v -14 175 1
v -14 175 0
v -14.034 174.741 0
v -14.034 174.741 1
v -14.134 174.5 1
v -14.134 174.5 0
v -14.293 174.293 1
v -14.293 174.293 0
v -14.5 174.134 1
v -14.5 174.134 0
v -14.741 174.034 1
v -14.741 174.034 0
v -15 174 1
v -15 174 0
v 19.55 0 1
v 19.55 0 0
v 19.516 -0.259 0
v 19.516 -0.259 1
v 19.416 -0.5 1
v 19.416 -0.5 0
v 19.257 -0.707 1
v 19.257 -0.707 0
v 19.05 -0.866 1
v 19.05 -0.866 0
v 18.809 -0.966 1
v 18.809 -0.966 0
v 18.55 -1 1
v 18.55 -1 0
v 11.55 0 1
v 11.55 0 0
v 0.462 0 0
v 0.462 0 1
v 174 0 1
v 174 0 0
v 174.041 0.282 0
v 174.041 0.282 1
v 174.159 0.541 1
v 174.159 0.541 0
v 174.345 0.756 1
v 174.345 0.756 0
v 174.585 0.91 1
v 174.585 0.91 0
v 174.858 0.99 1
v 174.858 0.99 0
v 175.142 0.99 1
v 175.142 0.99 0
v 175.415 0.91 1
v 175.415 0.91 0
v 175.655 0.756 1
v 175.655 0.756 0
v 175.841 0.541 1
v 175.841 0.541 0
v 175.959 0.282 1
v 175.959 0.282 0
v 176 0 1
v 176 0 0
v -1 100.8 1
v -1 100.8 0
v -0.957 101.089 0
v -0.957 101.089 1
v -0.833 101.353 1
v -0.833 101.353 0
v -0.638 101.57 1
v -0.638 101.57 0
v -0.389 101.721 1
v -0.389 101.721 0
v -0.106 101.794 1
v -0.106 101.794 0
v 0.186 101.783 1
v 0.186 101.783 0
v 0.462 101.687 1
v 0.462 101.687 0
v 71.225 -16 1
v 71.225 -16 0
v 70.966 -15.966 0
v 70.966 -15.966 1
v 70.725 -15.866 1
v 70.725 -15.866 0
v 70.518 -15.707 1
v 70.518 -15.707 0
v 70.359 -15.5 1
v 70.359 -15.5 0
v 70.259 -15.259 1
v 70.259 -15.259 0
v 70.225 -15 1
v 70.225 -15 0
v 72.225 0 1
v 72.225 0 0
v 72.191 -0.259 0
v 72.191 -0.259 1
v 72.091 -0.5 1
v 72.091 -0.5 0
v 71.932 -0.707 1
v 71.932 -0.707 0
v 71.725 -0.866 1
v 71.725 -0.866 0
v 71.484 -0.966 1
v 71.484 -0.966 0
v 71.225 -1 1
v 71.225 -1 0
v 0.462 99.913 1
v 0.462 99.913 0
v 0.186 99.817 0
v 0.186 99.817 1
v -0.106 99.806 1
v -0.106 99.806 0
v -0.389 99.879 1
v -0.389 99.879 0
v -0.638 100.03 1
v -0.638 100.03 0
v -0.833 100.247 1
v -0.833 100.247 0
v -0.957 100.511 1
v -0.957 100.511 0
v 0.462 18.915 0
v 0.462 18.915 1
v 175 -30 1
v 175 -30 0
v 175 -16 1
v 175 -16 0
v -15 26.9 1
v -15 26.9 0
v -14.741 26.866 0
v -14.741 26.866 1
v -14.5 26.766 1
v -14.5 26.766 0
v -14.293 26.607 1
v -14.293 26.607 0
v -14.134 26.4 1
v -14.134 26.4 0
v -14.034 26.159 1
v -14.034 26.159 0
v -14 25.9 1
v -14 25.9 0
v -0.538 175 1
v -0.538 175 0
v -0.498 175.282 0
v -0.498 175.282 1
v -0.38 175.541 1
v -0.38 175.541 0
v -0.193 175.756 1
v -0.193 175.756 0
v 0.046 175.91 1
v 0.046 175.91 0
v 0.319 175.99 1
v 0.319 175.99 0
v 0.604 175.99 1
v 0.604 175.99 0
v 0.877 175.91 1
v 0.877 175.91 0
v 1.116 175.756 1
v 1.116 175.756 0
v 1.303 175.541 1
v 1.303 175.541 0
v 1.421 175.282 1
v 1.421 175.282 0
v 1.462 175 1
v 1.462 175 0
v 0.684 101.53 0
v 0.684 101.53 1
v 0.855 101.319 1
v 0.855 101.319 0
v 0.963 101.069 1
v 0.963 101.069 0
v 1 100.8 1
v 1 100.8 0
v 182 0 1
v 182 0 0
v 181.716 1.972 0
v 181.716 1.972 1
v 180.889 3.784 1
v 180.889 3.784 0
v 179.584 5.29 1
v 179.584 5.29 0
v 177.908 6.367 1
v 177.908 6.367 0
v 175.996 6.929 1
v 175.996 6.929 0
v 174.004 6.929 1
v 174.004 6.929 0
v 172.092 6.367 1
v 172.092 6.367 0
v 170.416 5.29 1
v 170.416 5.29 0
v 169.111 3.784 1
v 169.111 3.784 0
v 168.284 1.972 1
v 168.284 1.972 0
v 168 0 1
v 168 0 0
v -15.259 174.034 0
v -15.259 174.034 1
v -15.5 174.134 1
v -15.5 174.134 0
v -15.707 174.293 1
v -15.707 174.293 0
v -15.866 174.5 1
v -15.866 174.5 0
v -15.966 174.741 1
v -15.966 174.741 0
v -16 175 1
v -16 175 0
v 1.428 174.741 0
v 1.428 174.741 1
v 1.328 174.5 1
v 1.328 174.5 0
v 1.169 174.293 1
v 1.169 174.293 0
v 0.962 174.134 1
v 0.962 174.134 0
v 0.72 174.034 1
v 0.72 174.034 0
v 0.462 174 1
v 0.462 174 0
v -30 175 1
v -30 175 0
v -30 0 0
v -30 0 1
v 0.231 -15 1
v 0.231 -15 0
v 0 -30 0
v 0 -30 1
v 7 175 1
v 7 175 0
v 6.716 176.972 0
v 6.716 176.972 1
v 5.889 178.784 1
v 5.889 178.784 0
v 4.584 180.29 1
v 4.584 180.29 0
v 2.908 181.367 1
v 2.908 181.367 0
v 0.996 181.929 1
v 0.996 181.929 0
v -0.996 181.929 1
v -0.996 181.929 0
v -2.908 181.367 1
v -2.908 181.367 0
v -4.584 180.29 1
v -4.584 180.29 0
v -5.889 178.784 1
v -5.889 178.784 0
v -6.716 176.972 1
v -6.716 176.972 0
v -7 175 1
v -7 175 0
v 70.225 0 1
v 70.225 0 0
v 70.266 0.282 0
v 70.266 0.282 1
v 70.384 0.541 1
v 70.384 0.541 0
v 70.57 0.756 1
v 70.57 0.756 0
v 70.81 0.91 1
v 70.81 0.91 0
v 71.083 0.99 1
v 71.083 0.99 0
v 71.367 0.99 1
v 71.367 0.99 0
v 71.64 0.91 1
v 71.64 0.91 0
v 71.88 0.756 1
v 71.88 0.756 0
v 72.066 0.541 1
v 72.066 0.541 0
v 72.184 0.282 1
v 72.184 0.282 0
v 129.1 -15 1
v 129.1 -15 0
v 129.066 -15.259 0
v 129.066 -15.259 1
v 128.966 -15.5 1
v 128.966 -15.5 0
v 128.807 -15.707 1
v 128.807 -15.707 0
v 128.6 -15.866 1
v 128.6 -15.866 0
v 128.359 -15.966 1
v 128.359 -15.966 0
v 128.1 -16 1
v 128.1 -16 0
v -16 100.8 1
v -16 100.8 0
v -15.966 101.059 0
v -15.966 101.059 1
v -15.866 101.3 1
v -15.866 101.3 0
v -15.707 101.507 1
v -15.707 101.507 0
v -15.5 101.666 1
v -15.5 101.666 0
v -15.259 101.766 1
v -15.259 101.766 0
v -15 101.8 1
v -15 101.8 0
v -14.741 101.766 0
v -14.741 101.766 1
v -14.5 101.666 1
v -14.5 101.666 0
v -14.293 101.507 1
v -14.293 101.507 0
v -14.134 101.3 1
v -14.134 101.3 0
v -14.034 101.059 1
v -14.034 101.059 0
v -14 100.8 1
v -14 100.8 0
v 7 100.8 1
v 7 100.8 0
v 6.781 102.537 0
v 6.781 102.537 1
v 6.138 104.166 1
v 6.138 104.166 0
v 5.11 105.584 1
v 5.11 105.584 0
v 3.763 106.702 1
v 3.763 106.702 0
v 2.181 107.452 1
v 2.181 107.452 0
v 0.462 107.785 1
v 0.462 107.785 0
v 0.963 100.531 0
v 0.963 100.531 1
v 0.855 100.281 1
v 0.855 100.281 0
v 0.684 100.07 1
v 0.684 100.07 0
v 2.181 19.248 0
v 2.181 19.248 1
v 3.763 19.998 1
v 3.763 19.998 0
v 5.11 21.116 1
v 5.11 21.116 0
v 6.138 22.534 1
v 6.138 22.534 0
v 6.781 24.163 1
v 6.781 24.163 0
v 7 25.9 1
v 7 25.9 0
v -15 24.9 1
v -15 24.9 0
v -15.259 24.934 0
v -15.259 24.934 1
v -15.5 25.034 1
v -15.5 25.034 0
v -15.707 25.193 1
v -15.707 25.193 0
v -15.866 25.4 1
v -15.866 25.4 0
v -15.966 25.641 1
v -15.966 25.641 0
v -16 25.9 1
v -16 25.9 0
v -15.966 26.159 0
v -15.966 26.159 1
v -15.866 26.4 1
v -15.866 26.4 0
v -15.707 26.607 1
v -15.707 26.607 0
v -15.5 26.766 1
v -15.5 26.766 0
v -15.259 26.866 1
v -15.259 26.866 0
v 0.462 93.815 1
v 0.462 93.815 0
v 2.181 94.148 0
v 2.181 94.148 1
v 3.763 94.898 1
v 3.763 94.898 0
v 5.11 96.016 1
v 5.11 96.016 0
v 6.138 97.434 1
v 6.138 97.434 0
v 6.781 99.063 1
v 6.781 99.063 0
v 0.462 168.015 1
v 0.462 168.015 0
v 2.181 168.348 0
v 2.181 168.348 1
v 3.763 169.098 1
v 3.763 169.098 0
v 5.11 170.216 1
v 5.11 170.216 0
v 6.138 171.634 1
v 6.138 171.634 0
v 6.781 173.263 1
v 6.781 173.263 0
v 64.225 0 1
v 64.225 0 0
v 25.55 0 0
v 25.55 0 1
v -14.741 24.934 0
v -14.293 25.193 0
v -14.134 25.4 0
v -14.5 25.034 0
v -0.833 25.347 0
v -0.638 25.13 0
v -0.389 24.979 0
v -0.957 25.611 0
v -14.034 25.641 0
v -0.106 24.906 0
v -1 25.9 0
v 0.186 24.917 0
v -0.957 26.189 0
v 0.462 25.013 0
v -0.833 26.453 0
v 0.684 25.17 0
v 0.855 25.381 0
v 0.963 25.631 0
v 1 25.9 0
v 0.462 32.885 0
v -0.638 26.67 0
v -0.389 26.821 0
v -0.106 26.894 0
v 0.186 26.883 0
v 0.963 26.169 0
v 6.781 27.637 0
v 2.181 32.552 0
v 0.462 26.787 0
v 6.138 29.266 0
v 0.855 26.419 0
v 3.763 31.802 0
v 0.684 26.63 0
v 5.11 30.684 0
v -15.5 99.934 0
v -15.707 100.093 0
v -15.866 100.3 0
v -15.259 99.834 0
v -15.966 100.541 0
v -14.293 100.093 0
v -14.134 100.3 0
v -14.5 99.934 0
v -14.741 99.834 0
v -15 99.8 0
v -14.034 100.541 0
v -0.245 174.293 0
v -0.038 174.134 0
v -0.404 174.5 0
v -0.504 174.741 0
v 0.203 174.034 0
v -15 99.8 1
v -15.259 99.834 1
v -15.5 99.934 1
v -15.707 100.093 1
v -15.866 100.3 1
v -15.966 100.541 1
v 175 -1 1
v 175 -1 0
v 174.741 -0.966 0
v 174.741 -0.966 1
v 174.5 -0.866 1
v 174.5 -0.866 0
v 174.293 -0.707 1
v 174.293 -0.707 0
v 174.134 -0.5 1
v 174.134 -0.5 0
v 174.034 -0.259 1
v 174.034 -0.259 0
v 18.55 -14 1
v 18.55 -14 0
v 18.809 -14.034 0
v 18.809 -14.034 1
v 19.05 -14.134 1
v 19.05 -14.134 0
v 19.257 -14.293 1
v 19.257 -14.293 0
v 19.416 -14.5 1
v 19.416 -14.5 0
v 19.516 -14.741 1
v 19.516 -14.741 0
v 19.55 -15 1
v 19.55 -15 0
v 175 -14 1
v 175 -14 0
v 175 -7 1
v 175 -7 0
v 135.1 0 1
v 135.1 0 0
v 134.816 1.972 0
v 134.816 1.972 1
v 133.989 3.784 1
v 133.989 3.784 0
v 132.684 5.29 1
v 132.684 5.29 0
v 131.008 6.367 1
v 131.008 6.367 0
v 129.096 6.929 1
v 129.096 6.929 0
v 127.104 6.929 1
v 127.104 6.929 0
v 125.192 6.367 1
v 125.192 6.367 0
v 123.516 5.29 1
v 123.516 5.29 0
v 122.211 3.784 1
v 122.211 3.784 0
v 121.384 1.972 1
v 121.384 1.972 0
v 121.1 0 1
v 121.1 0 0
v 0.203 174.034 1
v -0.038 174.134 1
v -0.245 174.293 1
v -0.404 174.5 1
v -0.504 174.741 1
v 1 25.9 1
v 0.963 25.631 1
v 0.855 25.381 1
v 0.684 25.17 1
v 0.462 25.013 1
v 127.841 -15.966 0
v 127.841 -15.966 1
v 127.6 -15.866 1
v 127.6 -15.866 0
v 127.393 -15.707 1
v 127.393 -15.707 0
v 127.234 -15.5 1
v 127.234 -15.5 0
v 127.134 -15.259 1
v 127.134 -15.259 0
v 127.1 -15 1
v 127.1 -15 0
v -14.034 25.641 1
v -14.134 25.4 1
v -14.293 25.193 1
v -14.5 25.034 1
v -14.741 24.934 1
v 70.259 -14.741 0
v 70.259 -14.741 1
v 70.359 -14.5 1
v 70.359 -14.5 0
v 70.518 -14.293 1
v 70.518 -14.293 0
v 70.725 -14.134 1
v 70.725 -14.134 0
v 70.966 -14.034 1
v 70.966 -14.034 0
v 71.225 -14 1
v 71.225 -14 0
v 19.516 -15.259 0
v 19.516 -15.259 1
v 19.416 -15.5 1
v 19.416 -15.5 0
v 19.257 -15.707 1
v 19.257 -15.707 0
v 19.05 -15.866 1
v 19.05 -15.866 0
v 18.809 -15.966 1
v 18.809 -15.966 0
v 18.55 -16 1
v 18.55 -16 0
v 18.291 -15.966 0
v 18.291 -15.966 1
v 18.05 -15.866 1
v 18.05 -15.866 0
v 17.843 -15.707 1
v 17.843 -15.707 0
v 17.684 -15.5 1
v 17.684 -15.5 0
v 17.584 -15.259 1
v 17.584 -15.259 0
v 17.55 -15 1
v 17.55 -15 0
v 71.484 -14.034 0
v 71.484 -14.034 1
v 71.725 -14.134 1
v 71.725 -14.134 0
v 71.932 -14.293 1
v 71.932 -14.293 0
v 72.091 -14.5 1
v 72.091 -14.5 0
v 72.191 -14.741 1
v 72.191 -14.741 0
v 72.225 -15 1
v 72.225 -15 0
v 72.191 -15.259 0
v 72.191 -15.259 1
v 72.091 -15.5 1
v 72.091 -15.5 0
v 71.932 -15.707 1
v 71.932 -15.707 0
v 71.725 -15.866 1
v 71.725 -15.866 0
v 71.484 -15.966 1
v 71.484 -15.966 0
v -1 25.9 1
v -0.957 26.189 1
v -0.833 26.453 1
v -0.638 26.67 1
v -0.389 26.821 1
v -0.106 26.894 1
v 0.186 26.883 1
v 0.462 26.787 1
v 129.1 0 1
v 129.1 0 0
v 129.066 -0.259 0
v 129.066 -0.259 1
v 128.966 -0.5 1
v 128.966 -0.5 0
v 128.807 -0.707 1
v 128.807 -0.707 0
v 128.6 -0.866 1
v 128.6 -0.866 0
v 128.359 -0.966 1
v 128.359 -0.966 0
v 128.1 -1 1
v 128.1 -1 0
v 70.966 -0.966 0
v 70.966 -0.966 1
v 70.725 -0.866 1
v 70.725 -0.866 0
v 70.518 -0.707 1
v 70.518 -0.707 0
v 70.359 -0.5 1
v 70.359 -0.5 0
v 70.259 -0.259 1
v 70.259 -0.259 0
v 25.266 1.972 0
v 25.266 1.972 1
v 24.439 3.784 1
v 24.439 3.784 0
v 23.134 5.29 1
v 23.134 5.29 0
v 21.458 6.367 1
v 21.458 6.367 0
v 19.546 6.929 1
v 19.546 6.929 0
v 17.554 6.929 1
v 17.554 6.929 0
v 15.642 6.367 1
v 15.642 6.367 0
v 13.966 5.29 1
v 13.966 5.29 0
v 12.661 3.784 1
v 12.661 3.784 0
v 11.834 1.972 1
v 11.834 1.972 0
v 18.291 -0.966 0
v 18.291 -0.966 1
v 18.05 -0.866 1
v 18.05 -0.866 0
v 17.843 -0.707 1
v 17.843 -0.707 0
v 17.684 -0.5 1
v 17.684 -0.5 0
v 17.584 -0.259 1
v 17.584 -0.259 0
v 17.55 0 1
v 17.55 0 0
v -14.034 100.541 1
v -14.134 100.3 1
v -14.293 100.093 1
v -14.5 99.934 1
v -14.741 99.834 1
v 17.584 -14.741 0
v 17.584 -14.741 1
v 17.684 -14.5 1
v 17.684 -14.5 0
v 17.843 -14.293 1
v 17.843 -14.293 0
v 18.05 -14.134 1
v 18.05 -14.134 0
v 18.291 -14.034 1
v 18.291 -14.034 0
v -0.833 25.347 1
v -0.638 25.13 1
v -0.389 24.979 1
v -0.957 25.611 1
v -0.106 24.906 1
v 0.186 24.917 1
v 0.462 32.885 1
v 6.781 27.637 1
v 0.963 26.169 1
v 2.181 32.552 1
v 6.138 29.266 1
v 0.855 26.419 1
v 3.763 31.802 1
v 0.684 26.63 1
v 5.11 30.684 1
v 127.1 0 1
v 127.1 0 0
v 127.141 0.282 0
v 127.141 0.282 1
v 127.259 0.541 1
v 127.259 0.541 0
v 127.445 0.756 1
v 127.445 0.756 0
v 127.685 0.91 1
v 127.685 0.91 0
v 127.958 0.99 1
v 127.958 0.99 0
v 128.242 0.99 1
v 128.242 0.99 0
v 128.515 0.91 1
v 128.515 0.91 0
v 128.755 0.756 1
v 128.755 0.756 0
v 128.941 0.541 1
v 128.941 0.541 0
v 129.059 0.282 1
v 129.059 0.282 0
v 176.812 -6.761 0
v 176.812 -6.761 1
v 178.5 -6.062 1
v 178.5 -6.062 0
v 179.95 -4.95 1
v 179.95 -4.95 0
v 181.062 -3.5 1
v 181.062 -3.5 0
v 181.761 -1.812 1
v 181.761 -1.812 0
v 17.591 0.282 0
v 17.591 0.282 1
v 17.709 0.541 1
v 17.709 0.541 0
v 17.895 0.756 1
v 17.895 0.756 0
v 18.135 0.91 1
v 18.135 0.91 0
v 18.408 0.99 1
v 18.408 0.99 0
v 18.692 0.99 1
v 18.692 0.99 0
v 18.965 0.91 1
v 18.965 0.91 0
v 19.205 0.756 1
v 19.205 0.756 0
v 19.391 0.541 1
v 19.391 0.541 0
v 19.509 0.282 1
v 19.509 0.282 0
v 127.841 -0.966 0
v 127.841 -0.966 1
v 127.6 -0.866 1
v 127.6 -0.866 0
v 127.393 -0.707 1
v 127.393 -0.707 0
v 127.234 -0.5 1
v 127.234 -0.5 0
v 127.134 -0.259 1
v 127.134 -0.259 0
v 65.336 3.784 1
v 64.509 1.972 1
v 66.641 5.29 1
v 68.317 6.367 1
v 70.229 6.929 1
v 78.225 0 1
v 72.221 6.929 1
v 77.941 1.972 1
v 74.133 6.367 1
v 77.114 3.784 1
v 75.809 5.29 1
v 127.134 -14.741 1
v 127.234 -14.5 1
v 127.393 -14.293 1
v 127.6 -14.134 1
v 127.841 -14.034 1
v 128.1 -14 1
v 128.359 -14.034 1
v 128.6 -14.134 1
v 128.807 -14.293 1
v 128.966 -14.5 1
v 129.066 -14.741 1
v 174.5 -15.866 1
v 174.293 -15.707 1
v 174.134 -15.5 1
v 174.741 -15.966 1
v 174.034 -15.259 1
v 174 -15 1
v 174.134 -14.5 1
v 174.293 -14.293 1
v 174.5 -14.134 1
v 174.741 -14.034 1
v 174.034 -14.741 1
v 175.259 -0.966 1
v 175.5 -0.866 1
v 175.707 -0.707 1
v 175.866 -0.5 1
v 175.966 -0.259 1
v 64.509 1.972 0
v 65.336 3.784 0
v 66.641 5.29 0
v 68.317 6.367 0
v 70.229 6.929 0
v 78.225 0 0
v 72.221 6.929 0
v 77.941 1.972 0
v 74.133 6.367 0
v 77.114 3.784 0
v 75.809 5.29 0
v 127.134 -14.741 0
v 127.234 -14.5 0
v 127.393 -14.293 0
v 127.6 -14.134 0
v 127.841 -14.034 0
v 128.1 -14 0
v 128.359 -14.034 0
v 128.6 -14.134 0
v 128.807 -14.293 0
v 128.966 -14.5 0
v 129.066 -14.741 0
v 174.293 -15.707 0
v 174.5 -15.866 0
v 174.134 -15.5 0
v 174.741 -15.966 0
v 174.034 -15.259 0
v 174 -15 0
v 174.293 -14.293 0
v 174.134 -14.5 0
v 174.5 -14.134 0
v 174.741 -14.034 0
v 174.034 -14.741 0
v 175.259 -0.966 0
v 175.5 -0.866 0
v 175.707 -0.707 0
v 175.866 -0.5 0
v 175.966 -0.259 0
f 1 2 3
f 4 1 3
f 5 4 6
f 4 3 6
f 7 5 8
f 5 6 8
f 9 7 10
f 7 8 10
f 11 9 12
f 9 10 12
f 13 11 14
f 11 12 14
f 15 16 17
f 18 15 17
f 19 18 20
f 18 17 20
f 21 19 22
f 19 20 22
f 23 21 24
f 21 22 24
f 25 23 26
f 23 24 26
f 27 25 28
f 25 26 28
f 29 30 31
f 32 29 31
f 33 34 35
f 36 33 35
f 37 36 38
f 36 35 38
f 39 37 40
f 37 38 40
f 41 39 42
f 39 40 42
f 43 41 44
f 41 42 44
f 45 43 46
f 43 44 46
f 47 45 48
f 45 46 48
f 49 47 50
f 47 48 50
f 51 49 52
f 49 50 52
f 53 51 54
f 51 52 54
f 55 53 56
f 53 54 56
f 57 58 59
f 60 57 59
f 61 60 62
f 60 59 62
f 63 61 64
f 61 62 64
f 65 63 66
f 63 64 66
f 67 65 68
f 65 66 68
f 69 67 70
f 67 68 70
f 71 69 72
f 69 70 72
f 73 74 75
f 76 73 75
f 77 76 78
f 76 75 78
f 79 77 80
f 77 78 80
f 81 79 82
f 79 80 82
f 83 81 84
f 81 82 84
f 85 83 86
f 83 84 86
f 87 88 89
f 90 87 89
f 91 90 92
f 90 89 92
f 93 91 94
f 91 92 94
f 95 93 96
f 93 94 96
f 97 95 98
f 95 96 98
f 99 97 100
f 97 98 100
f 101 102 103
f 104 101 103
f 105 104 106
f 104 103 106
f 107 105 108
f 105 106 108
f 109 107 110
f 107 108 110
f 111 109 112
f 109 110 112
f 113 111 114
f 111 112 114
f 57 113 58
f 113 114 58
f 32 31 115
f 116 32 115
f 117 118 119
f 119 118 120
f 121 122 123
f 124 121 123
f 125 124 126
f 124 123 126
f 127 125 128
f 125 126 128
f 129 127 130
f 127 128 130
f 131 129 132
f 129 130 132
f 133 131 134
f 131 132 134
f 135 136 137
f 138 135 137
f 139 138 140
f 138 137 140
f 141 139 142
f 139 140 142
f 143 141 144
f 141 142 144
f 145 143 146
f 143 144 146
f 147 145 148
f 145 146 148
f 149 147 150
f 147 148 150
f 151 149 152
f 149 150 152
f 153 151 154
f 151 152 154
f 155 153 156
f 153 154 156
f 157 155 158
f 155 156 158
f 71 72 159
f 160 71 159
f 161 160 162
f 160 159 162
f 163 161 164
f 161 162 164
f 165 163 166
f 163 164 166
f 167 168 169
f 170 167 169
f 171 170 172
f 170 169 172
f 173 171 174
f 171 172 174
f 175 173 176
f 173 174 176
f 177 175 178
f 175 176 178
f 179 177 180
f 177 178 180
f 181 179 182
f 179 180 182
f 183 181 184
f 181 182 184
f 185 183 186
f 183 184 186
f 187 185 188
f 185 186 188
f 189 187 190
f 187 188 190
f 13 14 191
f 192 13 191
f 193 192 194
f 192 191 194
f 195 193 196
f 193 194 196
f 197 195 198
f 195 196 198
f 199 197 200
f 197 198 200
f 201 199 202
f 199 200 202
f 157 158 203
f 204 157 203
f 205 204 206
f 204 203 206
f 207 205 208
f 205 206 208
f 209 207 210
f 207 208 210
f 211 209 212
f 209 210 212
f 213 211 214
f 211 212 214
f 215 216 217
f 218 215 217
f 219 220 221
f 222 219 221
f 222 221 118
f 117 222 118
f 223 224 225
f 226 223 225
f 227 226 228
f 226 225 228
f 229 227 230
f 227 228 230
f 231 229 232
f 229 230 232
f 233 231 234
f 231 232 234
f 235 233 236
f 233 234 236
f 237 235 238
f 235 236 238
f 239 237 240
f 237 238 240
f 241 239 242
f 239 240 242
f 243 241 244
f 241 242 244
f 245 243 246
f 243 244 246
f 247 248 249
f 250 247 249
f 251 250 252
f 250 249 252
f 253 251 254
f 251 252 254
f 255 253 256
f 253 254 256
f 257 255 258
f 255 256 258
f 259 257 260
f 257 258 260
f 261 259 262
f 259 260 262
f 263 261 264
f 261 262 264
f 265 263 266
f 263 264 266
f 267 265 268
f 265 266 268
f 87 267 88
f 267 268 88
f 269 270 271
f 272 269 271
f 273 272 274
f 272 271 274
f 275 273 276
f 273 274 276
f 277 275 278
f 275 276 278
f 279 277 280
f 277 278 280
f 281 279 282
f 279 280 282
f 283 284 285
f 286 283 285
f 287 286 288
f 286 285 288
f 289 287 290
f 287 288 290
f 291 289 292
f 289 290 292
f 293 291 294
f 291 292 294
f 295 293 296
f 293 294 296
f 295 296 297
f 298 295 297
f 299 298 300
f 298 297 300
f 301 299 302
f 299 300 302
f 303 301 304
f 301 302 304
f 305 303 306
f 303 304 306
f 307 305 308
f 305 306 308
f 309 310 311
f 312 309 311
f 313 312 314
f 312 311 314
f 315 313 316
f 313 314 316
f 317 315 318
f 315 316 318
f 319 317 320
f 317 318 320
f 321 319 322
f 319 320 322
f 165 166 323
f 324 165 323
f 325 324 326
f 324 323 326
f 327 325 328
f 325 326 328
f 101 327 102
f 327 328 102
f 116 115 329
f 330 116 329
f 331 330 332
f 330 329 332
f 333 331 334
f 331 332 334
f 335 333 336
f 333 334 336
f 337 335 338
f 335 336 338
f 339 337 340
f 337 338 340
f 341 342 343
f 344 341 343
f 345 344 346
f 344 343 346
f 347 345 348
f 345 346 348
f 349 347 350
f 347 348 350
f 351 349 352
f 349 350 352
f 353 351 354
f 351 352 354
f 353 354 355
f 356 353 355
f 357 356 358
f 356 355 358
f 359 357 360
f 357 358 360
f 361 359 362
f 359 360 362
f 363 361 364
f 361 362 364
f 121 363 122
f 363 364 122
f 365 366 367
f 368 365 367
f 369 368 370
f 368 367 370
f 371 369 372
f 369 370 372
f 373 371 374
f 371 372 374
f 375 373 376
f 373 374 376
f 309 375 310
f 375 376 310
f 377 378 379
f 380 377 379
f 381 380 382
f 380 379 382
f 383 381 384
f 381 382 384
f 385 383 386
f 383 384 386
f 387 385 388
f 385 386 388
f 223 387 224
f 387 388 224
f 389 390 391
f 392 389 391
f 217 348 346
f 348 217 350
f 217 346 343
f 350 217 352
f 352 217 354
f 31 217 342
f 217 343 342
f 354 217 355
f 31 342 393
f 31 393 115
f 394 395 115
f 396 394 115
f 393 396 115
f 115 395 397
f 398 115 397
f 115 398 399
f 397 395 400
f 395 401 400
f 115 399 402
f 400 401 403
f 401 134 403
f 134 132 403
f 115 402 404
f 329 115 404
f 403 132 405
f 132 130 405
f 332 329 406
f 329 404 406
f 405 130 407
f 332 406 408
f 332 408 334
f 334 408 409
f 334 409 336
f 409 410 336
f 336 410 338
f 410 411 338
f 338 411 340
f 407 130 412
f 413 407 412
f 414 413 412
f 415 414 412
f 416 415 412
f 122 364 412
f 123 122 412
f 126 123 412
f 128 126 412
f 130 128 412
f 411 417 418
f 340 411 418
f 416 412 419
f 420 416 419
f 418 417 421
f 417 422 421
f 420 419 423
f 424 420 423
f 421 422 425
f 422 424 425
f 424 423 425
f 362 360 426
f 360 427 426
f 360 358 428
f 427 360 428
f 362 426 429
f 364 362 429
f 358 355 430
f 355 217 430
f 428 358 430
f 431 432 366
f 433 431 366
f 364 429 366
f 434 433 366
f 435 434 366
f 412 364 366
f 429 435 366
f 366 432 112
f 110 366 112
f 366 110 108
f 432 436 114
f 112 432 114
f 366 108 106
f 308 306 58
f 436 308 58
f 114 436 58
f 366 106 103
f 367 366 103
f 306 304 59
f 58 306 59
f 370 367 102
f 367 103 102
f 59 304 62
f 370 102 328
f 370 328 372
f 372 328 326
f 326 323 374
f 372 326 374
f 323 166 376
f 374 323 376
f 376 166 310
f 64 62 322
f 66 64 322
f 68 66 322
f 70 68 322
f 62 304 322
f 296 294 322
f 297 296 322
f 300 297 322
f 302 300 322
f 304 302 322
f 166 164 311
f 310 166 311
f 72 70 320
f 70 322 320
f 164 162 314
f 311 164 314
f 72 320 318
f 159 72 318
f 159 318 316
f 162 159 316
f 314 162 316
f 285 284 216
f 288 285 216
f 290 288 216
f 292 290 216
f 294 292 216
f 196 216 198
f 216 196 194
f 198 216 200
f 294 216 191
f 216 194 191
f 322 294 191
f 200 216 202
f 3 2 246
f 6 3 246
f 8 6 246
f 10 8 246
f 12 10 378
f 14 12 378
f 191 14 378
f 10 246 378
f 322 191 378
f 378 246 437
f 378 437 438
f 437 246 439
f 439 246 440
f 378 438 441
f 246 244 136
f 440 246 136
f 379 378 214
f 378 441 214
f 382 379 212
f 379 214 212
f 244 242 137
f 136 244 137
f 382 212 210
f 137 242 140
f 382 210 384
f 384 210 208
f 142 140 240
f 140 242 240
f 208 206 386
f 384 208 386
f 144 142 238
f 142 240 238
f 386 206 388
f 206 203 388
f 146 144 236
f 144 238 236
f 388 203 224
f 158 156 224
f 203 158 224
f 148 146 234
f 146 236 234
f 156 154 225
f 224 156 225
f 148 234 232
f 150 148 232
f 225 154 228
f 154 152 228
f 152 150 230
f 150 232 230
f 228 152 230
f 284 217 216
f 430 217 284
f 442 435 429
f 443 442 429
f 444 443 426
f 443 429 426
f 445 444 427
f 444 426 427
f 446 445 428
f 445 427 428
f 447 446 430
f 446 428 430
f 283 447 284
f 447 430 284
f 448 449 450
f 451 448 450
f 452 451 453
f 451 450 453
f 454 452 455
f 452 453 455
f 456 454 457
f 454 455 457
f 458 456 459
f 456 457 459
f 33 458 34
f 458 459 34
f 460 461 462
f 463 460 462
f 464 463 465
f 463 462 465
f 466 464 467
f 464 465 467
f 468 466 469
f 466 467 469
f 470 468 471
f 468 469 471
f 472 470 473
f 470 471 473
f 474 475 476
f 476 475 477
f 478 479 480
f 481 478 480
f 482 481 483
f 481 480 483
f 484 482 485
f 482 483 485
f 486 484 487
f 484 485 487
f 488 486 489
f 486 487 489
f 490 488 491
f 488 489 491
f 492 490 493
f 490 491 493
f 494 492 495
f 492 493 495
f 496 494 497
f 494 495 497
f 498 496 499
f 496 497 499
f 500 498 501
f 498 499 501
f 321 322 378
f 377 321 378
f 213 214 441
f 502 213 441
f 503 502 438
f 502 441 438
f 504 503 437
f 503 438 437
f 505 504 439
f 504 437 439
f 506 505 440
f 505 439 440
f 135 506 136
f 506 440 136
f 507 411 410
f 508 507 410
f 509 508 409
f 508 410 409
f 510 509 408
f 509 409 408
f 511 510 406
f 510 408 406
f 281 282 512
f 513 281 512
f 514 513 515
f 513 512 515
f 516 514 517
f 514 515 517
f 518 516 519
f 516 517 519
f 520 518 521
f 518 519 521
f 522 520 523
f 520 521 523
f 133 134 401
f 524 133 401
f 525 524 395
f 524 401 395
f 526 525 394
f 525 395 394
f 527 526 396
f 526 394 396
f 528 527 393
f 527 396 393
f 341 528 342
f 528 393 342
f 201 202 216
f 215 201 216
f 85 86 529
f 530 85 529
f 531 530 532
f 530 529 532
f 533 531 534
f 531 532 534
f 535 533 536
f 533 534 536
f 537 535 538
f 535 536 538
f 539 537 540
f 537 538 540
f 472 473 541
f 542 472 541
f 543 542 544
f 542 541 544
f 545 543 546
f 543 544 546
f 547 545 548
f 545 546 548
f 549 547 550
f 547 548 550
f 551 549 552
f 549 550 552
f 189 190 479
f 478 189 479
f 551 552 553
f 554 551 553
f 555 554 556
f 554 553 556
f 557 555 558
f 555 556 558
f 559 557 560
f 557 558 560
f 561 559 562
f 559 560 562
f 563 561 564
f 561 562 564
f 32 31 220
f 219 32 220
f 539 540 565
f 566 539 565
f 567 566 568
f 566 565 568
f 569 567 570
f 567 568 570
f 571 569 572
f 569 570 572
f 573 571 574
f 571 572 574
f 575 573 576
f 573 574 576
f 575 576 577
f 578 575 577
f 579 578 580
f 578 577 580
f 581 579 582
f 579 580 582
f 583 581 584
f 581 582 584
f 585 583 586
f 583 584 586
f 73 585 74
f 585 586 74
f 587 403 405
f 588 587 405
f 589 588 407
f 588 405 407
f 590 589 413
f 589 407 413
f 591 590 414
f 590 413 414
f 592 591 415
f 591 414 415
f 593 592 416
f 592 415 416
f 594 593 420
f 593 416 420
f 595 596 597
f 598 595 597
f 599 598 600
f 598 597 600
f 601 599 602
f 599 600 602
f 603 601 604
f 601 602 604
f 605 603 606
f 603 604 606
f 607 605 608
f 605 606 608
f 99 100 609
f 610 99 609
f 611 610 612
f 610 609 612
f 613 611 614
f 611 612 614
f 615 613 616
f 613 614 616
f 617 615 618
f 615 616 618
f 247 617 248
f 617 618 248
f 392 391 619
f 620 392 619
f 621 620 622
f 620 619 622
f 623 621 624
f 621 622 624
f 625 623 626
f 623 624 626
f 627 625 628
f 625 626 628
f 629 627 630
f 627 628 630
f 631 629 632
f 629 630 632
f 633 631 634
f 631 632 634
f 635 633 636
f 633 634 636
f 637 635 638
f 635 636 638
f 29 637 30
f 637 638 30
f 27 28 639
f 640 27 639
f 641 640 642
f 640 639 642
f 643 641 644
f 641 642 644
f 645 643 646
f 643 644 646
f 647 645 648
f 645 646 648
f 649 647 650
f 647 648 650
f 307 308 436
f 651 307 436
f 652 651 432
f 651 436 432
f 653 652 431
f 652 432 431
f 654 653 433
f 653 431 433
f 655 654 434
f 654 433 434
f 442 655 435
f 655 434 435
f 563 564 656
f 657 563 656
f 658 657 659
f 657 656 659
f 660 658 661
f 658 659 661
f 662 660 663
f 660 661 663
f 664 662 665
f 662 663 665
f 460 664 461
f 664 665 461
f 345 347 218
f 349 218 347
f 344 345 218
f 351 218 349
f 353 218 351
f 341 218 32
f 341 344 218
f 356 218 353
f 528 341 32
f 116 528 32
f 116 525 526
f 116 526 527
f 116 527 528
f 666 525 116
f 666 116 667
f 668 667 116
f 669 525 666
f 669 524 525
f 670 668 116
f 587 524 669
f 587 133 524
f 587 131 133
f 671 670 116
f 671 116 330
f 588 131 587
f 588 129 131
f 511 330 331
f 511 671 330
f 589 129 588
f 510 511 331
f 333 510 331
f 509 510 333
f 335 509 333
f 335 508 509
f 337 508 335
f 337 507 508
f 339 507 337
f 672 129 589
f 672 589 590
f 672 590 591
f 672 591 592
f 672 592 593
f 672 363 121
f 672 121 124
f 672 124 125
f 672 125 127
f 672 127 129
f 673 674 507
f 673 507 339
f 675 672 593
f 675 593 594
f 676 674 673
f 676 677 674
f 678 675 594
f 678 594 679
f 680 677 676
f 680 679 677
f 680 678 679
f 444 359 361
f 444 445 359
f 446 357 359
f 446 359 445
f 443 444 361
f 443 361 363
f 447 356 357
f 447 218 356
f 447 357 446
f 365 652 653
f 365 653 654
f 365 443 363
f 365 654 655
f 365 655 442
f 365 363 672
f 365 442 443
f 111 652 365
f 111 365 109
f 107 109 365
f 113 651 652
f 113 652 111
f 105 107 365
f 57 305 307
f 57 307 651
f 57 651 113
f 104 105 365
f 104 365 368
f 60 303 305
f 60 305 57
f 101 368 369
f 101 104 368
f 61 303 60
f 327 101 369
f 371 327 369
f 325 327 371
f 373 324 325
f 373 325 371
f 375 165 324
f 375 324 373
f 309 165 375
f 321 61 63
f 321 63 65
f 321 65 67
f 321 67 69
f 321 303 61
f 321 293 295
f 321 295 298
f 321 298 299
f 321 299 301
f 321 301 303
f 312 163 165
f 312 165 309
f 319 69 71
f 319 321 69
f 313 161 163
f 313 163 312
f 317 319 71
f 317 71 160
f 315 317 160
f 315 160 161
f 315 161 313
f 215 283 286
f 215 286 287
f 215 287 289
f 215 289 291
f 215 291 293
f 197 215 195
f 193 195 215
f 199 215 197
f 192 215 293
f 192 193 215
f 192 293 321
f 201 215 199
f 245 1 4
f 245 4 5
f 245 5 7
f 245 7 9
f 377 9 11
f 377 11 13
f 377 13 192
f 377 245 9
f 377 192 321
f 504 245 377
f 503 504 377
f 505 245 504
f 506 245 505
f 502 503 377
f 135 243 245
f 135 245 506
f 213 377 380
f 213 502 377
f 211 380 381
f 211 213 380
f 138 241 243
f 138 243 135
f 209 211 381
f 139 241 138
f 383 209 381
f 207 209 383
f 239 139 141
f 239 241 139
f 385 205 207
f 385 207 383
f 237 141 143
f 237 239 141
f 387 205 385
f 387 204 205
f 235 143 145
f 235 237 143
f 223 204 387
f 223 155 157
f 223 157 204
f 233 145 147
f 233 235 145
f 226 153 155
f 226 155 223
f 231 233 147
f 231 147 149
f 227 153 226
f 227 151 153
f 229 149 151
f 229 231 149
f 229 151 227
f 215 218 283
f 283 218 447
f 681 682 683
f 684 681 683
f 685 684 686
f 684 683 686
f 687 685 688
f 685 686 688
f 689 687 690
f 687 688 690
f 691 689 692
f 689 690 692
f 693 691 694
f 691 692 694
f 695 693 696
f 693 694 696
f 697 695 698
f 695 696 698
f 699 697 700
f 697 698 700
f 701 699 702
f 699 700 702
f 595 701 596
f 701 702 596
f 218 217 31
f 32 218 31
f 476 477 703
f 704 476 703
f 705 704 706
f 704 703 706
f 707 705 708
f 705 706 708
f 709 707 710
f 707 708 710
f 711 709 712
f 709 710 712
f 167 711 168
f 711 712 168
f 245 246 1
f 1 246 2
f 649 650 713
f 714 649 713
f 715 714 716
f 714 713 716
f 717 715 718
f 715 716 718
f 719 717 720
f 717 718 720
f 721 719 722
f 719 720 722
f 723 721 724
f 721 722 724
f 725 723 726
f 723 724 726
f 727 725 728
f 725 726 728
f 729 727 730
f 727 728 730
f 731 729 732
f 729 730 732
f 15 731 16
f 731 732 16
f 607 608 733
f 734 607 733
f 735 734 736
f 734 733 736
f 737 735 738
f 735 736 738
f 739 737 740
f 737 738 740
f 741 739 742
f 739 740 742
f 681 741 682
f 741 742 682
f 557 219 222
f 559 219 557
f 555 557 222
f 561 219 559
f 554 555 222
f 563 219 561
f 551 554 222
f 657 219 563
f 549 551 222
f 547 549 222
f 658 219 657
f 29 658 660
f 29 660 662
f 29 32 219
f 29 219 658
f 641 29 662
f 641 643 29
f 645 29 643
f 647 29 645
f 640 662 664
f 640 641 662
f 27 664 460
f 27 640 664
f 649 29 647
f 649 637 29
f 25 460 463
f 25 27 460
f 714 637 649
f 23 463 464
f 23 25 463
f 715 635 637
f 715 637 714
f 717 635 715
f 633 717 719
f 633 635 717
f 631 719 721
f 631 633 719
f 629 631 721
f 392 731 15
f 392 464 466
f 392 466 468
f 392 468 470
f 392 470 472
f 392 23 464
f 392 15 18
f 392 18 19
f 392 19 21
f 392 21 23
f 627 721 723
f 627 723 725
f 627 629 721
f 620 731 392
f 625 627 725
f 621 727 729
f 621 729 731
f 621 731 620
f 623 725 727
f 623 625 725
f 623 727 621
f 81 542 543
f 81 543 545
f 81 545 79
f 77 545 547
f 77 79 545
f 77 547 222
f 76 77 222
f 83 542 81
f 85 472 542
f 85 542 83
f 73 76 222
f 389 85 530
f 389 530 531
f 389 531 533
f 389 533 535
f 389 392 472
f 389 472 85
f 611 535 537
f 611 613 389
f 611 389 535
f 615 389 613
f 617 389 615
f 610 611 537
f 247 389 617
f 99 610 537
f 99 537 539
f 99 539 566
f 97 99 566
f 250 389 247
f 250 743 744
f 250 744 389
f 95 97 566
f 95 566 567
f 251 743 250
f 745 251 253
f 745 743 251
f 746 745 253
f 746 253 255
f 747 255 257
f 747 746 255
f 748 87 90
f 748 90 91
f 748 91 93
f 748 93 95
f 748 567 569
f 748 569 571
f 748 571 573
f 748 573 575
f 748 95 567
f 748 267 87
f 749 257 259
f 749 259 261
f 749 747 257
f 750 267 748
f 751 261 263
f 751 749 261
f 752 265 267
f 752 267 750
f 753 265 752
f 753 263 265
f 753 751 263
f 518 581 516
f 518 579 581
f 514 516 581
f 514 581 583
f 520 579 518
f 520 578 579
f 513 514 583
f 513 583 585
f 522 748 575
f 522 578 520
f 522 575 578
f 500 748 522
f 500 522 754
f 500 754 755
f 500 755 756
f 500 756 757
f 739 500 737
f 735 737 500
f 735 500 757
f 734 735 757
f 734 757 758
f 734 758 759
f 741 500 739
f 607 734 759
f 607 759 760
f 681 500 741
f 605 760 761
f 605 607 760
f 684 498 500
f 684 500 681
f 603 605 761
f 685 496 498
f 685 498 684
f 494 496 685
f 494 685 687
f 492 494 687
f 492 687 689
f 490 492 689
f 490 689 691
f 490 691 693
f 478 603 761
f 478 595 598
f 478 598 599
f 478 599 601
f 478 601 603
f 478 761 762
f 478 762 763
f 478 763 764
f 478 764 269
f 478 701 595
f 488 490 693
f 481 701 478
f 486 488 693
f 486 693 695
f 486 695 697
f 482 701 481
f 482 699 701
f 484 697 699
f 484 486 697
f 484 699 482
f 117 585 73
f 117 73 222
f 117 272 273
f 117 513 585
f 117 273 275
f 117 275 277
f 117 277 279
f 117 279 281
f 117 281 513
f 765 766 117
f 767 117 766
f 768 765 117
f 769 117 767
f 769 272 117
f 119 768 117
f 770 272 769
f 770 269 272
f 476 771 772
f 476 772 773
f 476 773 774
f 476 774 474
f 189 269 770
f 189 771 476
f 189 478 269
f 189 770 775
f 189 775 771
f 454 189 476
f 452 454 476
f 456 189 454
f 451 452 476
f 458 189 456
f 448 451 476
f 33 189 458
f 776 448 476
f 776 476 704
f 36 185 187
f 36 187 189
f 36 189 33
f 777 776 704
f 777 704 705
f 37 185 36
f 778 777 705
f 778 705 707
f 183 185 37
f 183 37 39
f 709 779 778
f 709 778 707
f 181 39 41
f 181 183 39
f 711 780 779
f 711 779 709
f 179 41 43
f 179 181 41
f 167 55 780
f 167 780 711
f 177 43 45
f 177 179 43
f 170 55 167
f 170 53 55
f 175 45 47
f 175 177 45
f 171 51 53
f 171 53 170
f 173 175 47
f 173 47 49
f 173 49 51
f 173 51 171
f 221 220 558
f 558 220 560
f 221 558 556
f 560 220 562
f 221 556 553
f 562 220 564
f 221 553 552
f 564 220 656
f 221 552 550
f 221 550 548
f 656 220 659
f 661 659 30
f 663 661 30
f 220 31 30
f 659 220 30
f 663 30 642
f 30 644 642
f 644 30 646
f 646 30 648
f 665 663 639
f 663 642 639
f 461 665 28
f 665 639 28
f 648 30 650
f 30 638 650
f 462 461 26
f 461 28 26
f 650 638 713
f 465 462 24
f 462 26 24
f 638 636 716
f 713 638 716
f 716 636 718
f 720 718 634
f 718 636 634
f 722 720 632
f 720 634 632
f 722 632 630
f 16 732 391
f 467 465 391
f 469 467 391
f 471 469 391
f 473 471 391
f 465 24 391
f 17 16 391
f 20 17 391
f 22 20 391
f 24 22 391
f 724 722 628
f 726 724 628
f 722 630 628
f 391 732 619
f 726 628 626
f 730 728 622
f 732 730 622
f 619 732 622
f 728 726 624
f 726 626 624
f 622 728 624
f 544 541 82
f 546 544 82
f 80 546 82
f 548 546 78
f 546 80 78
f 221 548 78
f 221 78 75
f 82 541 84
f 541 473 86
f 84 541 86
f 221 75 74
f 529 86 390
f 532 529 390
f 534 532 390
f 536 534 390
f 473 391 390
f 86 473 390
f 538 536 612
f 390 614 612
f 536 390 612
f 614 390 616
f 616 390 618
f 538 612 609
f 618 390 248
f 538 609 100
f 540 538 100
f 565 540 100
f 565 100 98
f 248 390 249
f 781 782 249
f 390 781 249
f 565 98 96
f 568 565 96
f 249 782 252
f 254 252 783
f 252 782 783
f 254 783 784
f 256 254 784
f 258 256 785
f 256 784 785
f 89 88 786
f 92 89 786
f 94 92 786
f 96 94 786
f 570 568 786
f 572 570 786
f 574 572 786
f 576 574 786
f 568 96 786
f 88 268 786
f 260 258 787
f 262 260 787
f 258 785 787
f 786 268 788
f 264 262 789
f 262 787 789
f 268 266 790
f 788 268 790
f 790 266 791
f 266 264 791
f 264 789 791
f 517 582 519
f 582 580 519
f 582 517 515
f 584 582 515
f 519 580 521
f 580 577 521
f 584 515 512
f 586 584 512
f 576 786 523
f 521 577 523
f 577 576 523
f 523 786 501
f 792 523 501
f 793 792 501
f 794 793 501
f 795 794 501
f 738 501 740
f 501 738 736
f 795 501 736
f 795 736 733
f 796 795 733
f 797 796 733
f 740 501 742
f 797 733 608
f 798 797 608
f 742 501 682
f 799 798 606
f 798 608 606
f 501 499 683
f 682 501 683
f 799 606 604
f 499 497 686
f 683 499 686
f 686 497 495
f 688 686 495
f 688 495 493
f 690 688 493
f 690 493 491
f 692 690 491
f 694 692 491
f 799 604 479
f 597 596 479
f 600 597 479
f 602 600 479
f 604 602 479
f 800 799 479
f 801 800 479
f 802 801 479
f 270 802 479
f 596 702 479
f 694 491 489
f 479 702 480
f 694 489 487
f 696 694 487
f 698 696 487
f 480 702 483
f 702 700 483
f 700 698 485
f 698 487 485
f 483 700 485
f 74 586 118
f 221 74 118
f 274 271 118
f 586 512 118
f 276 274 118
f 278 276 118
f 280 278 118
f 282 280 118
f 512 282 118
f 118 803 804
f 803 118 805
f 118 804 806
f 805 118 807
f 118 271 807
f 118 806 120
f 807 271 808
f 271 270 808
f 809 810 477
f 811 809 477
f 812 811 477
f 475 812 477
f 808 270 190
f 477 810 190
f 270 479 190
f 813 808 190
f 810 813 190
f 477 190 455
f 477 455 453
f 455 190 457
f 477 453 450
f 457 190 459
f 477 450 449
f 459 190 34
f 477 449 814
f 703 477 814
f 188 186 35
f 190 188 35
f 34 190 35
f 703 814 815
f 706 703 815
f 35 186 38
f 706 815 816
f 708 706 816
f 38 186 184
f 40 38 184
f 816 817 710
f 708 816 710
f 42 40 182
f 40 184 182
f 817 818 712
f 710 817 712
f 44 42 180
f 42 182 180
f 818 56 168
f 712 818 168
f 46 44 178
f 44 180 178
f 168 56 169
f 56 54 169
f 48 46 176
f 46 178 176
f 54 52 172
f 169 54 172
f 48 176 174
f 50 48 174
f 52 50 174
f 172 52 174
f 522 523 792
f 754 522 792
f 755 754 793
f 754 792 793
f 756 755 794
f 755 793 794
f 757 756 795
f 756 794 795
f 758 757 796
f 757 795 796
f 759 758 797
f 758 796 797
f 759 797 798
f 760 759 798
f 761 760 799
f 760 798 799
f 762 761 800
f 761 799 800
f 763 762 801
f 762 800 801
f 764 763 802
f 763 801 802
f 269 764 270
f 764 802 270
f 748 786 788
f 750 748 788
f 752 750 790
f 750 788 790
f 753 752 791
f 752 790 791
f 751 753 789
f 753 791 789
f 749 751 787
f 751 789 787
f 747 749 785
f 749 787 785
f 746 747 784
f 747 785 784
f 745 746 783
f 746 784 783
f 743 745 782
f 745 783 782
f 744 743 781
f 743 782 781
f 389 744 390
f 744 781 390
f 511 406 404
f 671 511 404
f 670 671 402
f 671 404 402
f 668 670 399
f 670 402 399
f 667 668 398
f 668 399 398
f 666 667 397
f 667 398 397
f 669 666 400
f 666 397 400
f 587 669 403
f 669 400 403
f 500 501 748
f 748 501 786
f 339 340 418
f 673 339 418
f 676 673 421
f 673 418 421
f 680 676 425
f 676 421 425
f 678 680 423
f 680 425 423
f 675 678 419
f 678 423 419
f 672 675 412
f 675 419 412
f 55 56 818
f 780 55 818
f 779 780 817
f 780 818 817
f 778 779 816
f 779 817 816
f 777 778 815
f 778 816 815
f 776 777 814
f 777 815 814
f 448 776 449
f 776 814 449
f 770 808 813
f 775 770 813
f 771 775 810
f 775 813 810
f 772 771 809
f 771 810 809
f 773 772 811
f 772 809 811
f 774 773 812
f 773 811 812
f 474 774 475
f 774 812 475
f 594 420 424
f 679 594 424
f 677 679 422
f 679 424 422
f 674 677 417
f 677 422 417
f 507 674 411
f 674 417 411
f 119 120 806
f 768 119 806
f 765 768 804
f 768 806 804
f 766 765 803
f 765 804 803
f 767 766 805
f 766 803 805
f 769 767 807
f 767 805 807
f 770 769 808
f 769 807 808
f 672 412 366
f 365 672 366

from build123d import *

# Parameters (mm, degrees)
F1_DEPTH = 1


with BuildPart() as f1:
    # F0 (on Top) → F1 (new body)
    with BuildSketch(Plane.XY):
        with BuildLine():
            ThreePointArc((182, 0), (175, 7), (168, 0))
            Line((168, 0), (174, 0))
            ThreePointArc((174, 0), (175, 1), (176, 0))
            ThreePointArc((176, 0), (175.7071067812, -0.7071067812), (175, -1))
            Line((175, -1), (175, -7))
            ThreePointArc((175, -7), (179.9497474683, -4.9497474683), (182, 0))
        make_face()
        with BuildLine():
            Line((19.55, 0), (25.55, 0))
            ThreePointArc((25.55, 0), (18.55, 7), (11.55, 0))
            Line((11.55, 0), (17.55, 0))
            ThreePointArc((17.55, 0), (18.55, 1), (19.55, 0))
        make_face()
        with BuildLine():
            ThreePointArc((78.225, 0), (71.225, 7), (64.225, 0))
            Line((64.225, 0), (70.225, 0))
            ThreePointArc((70.225, 0), (71.225, 1), (72.225, 0))
            Line((72.225, 0), (78.225, 0))
        make_face()
        with BuildLine():
            ThreePointArc((135.1, 0), (128.1, 7), (121.1, 0))
            Line((121.1, 0), (127.1, 0))
            ThreePointArc((127.1, 0), (128.1, 1), (129.1, 0))
            Line((129.1, 0), (135.1, 0))
        make_face()
        with BuildLine():
            Line((174, 0), (168, 0))
            ThreePointArc((168, 0), (170.0502525317, -4.9497474683), (175, -7))
            Line((175, -7), (175, -1))
            ThreePointArc((175, -1), (174.2928932188, -0.7071067812), (174, 0))
        make_face()
        with BuildLine():
            Line((17.55, -15), (0.2308085532, -15))
            Line((0.2308085532, -15), (0, -30))
            Line((0, -30), (18.55, -30))
            Line((18.55, -30), (18.55, -16))
            ThreePointArc((18.55, -16), (17.8428932188, -15.7071067812), (17.55, -15))
        make_face()
        with BuildLine():
            ThreePointArc((18.55, -7), (13.6002525317, -4.9497474683), (11.55, 0))
            Line((11.55, 0), (0.4616171063, 0))
            Line((0.4616171063, 0), (0.2308085532, -15))
            Line((0.2308085532, -15), (17.55, -15))
            ThreePointArc((17.55, -15), (17.8428932188, -14.2928932188), (18.55, -14))
            Line((18.55, -14), (18.55, -7))
        make_face()
        with BuildLine():
            Line((17.55, 0), (11.55, 0))
            ThreePointArc((11.55, 0), (13.6002525317, -4.9497474683), (18.55, -7))
            Line((18.55, -7), (18.55, -1))
            ThreePointArc((18.55, -1), (17.8428932188, -0.7071067812), (17.55, 0))
        make_face()
        with BuildLine():
            ThreePointArc((18.55, -7), (23.4997474683, -4.9497474683), (25.55, 0))
            Line((25.55, 0), (19.55, 0))
            ThreePointArc((19.55, 0), (19.2571067812, -0.7071067812), (18.55, -1))
            Line((18.55, -1), (18.55, -7))
        make_face()
        with BuildLine():
            Line((70.225, 0), (64.225, 0))
            ThreePointArc((64.225, 0), (66.2752525317, -4.9497474683), (71.225, -7))
            Line((71.225, -7), (71.225, -1))
            ThreePointArc((71.225, -1), (70.5178932188, -0.7071067812), (70.225, 0))
        make_face()
        with BuildLine():
            ThreePointArc((71.225, -7), (76.1747474683, -4.9497474683), (78.225, 0))
            Line((78.225, 0), (72.225, 0))
            ThreePointArc((72.225, 0), (71.9321067812, -0.7071067812), (71.225, -1))
            Line((71.225, -1), (71.225, -7))
        make_face()
        with BuildLine():
            Line((127.1, 0), (121.1, 0))
            ThreePointArc((121.1, 0), (123.1502525317, -4.9497474683), (128.1, -7))
            Line((128.1, -7), (128.1, -1))
            ThreePointArc((128.1, -1), (127.3928932188, -0.7071067812), (127.1, 0))
        make_face()
        with BuildLine():
            ThreePointArc((128.1, -7), (133.0497474683, -4.9497474683), (135.1, 0))
            Line((135.1, 0), (129.1, 0))
            ThreePointArc((129.1, 0), (128.8071067812, -0.7071067812), (128.1, -1))
            Line((128.1, -1), (128.1, -7))
        make_face()
        with BuildLine():
            Line((174, -15), (129.1, -15))
            ThreePointArc((129.1, -15), (128.8071067812, -15.7071067812), (128.1, -16))
            Line((128.1, -16), (128.1, -30))
            Line((128.1, -30), (175, -30))
            Line((175, -30), (175, -16))
            ThreePointArc((175, -16), (174.2928932188, -15.7071067812), (174, -15))
        make_face()
        with BuildLine():
            Line((70.225, -15), (19.55, -15))
            ThreePointArc((19.55, -15), (19.2571067812, -15.7071067812), (18.55, -16))
            Line((18.55, -16), (18.55, -30))
            Line((18.55, -30), (71.225, -30))
            Line((71.225, -30), (71.225, -16))
            ThreePointArc((71.225, -16), (70.5178932188, -15.7071067812), (70.225, -15))
        make_face()
        with BuildLine():
            Line((127.1, -15), (72.225, -15))
            ThreePointArc((72.225, -15), (71.9321067812, -15.7071067812), (71.225, -16))
            Line((71.225, -16), (71.225, -30))
            Line((71.225, -30), (128.1, -30))
            Line((128.1, -30), (128.1, -16))
            ThreePointArc((128.1, -16), (127.3928932188, -15.7071067812), (127.1, -15))
        make_face()
        with BuildLine():
            Line((168, 0), (135.1, 0))
            ThreePointArc((135.1, 0), (133.0497474683, -4.9497474683), (128.1, -7))
            Line((128.1, -7), (128.1, -14))
            ThreePointArc((128.1, -14), (128.8071067812, -14.2928932188), (129.1, -15))
            Line((129.1, -15), (174, -15))
            ThreePointArc((174, -15), (174.2928932188, -14.2928932188), (175, -14))
            Line((175, -14), (175, -7))
            ThreePointArc((175, -7), (170.0502525317, -4.9497474683), (168, 0))
        make_face()
        with BuildLine():
            Line((64.225, 0), (25.55, 0))
            ThreePointArc((25.55, 0), (23.4997474683, -4.9497474683), (18.55, -7))
            Line((18.55, -7), (18.55, -14))
            ThreePointArc((18.55, -14), (19.2571067812, -14.2928932188), (19.55, -15))
            Line((19.55, -15), (70.225, -15))
            ThreePointArc((70.225, -15), (70.5178932188, -14.2928932188), (71.225, -14))
            Line((71.225, -14), (71.225, -7))
            ThreePointArc((71.225, -7), (66.2752525317, -4.9497474683), (64.225, 0))
        make_face()
        with BuildLine():
            Line((121.1, 0), (78.225, 0))
            ThreePointArc((78.225, 0), (76.1747474683, -4.9497474683), (71.225, -7))
            Line((71.225, -7), (71.225, -14))
            ThreePointArc((71.225, -14), (71.9321067812, -14.2928932188), (72.225, -15))
            Line((72.225, -15), (127.1, -15))
            ThreePointArc((127.1, -15), (127.3928932188, -14.2928932188), (128.1, -14))
            Line((128.1, -14), (128.1, -7))
            ThreePointArc((128.1, -7), (123.1502525317, -4.9497474683), (121.1, 0))
        make_face()
    extrude(amount=F1_DEPTH)


with BuildPart() as f1b:
    # F0 (on Top) → F1, piece 2 (new body)
    with BuildSketch(Plane.XY):
        with BuildLine():
            Line((0.4616171063, 174), (0.4616171063, 168.0152373235))
            ThreePointArc((0.4616171063, 168.0152373235), (5.1103483122, 170.2162420496), (7, 175))
            ThreePointArc((7, 175), (0, 182), (-7, 175))
            Line((-7, 175), (-0.5383828937, 175))
            ThreePointArc((-0.5383828937, 175), (0.4616171063, 176), (1.4616171063, 175))
            ThreePointArc((1.4616171063, 175), (1.1687238875, 174.2928932188), (0.4616171063, 174))
        make_face()
        with BuildLine():
            Line((0.4616171063, 25.0129207211), (0.4616171063, 18.9152373235))
            ThreePointArc((0.4616171063, 18.9152373235), (5.1103483122, 21.1162420496), (7, 25.9))
            ThreePointArc((7, 25.9), (5.1103483122, 30.6837579504), (0.4616171063, 32.8847626765))
            Line((0.4616171063, 32.8847626765), (0.4616171063, 26.7870792789))
            ThreePointArc((0.4616171063, 26.7870792789), (0.8548734135, 26.4188366283), (1, 25.9))
            ThreePointArc((1, 25.9), (0.8548734135, 25.3811633717), (0.4616171063, 25.0129207211))
        make_face()
        with BuildLine():
            Line((0.4616171063, 99.9129207211), (0.4616171063, 93.8152373235))
            ThreePointArc((0.4616171063, 93.8152373235), (5.1103483122, 96.0162420496), (7, 100.8))
            ThreePointArc((7, 100.8), (5.1103483122, 105.5837579504), (0.4616171063, 107.7847626765))
            Line((0.4616171063, 107.7847626765), (0.4616171063, 101.6870792789))
            ThreePointArc((0.4616171063, 101.6870792789), (0.8548734135, 101.3188366283), (1, 100.8))
            ThreePointArc((1, 100.8), (0.8548734135, 100.2811633717), (0.4616171063, 99.9129207211))
        make_face()
        with BuildLine():
            ThreePointArc((-7, 175), (-4.7837579504, 169.8896516878), (0.4616171063, 168.0152373235))
            Line((0.4616171063, 168.0152373235), (0.4616171063, 174))
            ThreePointArc((0.4616171063, 174), (-0.2454896748, 174.2928932188), (-0.5383828937, 175))
            Line((-0.5383828937, 175), (-7, 175))
        make_face()
        with BuildLine():
            Line((-30, 0), (-15, 0))
            Line((-15, 0), (-15, 24.9))
            ThreePointArc((-15, 24.9), (-15.7071067812, 25.1928932188), (-16, 25.9))
            Line((-16, 25.9), (-30, 25.9))
            Line((-30, 25.9), (-30, 0))
        make_face()
        with BuildLine():
            ThreePointArc((0.4616171063, 32.8847626765), (-4.7837579504, 31.0103483122), (-7, 25.9))
            Line((-7, 25.9), (-1, 25.9))
            ThreePointArc((-1, 25.9), (-0.5188366283, 26.7548734135), (0.4616171063, 26.7870792789))
            Line((0.4616171063, 26.7870792789), (0.4616171063, 32.8847626765))
        make_face()
        with BuildLine():
            Line((-15, 0), (0.4616171063, 0))
            Line((0.4616171063, 0), (0.4616171063, 18.9152373235))
            ThreePointArc((0.4616171063, 18.9152373235), (-4.7837579504, 20.7896516878), (-7, 25.9))
            Line((-7, 25.9), (-14, 25.9))
            ThreePointArc((-14, 25.9), (-14.2928932188, 25.1928932188), (-15, 24.9))
            Line((-15, 24.9), (-15, 0))
        make_face()
        with BuildLine():
            ThreePointArc((-7, 25.9), (-4.7837579504, 20.7896516878), (0.4616171063, 18.9152373235))
            Line((0.4616171063, 18.9152373235), (0.4616171063, 25.0129207211))
            ThreePointArc((0.4616171063, 25.0129207211), (-0.5188366283, 25.0451265865), (-1, 25.9))
            Line((-1, 25.9), (-7, 25.9))
        make_face()
        with BuildLine():
            ThreePointArc((0.4616171063, 107.7847626765), (-4.7837579504, 105.9103483122), (-7, 100.8))
            Line((-7, 100.8), (-1, 100.8))
            ThreePointArc((-1, 100.8), (-0.5188366283, 101.6548734135), (0.4616171063, 101.6870792789))
            Line((0.4616171063, 101.6870792789), (0.4616171063, 107.7847626765))
        make_face()
        with BuildLine():
            ThreePointArc((-7, 100.8), (-4.7837579504, 95.6896516878), (0.4616171063, 93.8152373235))
            Line((0.4616171063, 93.8152373235), (0.4616171063, 99.9129207211))
            ThreePointArc((0.4616171063, 99.9129207211), (-0.5188366283, 99.9451265865), (-1, 100.8))
            Line((-1, 100.8), (-7, 100.8))
        make_face()
        with BuildLine():
            Line((-30, 175), (-30, 100.8))
            Line((-30, 100.8), (-16, 100.8))
            ThreePointArc((-16, 100.8), (-15.7071067812, 101.5071067812), (-15, 101.8))
            Line((-15, 101.8), (-15, 174))
            ThreePointArc((-15, 174), (-15.7071067812, 174.2928932188), (-16, 175))
            Line((-16, 175), (-30, 175))
        make_face()
        with BuildLine():
            Line((-30, 25.9), (-16, 25.9))
            ThreePointArc((-16, 25.9), (-15.7071067812, 26.6071067812), (-15, 26.9))
            Line((-15, 26.9), (-15, 99.8))
            ThreePointArc((-15, 99.8), (-15.7071067812, 100.0928932188), (-16, 100.8))
            Line((-16, 100.8), (-30, 100.8))
            Line((-30, 100.8), (-30, 25.9))
        make_face()
        with BuildLine():
            Line((-14, 100.8), (-7, 100.8))
            ThreePointArc((-7, 100.8), (-4.7837579504, 105.9103483122), (0.4616171063, 107.7847626765))
            Line((0.4616171063, 107.7847626765), (0.4616171063, 168.0152373235))
            ThreePointArc((0.4616171063, 168.0152373235), (-4.7837579504, 169.8896516878), (-7, 175))
            Line((-7, 175), (-14, 175))
            ThreePointArc((-14, 175), (-14.2928932188, 174.2928932188), (-15, 174))
            Line((-15, 174), (-15, 101.8))
            ThreePointArc((-15, 101.8), (-14.2928932188, 101.5071067812), (-14, 100.8))
        make_face()
        with BuildLine():
            Line((-14, 25.9), (-7, 25.9))
            ThreePointArc((-7, 25.9), (-4.7837579504, 31.0103483122), (0.4616171063, 32.8847626765))
            Line((0.4616171063, 32.8847626765), (0.4616171063, 93.8152373235))
            ThreePointArc((0.4616171063, 93.8152373235), (-4.7837579504, 95.6896516878), (-7, 100.8))
            Line((-7, 100.8), (-14, 100.8))
            ThreePointArc((-14, 100.8), (-14.2928932188, 100.0928932188), (-15, 99.8))
            Line((-15, 99.8), (-15, 26.9))
            ThreePointArc((-15, 26.9), (-14.2928932188, 26.6071067812), (-14, 25.9))
        make_face()
    extrude(amount=F1_DEPTH)


solid = Compound([f1.part, f1b.part])
